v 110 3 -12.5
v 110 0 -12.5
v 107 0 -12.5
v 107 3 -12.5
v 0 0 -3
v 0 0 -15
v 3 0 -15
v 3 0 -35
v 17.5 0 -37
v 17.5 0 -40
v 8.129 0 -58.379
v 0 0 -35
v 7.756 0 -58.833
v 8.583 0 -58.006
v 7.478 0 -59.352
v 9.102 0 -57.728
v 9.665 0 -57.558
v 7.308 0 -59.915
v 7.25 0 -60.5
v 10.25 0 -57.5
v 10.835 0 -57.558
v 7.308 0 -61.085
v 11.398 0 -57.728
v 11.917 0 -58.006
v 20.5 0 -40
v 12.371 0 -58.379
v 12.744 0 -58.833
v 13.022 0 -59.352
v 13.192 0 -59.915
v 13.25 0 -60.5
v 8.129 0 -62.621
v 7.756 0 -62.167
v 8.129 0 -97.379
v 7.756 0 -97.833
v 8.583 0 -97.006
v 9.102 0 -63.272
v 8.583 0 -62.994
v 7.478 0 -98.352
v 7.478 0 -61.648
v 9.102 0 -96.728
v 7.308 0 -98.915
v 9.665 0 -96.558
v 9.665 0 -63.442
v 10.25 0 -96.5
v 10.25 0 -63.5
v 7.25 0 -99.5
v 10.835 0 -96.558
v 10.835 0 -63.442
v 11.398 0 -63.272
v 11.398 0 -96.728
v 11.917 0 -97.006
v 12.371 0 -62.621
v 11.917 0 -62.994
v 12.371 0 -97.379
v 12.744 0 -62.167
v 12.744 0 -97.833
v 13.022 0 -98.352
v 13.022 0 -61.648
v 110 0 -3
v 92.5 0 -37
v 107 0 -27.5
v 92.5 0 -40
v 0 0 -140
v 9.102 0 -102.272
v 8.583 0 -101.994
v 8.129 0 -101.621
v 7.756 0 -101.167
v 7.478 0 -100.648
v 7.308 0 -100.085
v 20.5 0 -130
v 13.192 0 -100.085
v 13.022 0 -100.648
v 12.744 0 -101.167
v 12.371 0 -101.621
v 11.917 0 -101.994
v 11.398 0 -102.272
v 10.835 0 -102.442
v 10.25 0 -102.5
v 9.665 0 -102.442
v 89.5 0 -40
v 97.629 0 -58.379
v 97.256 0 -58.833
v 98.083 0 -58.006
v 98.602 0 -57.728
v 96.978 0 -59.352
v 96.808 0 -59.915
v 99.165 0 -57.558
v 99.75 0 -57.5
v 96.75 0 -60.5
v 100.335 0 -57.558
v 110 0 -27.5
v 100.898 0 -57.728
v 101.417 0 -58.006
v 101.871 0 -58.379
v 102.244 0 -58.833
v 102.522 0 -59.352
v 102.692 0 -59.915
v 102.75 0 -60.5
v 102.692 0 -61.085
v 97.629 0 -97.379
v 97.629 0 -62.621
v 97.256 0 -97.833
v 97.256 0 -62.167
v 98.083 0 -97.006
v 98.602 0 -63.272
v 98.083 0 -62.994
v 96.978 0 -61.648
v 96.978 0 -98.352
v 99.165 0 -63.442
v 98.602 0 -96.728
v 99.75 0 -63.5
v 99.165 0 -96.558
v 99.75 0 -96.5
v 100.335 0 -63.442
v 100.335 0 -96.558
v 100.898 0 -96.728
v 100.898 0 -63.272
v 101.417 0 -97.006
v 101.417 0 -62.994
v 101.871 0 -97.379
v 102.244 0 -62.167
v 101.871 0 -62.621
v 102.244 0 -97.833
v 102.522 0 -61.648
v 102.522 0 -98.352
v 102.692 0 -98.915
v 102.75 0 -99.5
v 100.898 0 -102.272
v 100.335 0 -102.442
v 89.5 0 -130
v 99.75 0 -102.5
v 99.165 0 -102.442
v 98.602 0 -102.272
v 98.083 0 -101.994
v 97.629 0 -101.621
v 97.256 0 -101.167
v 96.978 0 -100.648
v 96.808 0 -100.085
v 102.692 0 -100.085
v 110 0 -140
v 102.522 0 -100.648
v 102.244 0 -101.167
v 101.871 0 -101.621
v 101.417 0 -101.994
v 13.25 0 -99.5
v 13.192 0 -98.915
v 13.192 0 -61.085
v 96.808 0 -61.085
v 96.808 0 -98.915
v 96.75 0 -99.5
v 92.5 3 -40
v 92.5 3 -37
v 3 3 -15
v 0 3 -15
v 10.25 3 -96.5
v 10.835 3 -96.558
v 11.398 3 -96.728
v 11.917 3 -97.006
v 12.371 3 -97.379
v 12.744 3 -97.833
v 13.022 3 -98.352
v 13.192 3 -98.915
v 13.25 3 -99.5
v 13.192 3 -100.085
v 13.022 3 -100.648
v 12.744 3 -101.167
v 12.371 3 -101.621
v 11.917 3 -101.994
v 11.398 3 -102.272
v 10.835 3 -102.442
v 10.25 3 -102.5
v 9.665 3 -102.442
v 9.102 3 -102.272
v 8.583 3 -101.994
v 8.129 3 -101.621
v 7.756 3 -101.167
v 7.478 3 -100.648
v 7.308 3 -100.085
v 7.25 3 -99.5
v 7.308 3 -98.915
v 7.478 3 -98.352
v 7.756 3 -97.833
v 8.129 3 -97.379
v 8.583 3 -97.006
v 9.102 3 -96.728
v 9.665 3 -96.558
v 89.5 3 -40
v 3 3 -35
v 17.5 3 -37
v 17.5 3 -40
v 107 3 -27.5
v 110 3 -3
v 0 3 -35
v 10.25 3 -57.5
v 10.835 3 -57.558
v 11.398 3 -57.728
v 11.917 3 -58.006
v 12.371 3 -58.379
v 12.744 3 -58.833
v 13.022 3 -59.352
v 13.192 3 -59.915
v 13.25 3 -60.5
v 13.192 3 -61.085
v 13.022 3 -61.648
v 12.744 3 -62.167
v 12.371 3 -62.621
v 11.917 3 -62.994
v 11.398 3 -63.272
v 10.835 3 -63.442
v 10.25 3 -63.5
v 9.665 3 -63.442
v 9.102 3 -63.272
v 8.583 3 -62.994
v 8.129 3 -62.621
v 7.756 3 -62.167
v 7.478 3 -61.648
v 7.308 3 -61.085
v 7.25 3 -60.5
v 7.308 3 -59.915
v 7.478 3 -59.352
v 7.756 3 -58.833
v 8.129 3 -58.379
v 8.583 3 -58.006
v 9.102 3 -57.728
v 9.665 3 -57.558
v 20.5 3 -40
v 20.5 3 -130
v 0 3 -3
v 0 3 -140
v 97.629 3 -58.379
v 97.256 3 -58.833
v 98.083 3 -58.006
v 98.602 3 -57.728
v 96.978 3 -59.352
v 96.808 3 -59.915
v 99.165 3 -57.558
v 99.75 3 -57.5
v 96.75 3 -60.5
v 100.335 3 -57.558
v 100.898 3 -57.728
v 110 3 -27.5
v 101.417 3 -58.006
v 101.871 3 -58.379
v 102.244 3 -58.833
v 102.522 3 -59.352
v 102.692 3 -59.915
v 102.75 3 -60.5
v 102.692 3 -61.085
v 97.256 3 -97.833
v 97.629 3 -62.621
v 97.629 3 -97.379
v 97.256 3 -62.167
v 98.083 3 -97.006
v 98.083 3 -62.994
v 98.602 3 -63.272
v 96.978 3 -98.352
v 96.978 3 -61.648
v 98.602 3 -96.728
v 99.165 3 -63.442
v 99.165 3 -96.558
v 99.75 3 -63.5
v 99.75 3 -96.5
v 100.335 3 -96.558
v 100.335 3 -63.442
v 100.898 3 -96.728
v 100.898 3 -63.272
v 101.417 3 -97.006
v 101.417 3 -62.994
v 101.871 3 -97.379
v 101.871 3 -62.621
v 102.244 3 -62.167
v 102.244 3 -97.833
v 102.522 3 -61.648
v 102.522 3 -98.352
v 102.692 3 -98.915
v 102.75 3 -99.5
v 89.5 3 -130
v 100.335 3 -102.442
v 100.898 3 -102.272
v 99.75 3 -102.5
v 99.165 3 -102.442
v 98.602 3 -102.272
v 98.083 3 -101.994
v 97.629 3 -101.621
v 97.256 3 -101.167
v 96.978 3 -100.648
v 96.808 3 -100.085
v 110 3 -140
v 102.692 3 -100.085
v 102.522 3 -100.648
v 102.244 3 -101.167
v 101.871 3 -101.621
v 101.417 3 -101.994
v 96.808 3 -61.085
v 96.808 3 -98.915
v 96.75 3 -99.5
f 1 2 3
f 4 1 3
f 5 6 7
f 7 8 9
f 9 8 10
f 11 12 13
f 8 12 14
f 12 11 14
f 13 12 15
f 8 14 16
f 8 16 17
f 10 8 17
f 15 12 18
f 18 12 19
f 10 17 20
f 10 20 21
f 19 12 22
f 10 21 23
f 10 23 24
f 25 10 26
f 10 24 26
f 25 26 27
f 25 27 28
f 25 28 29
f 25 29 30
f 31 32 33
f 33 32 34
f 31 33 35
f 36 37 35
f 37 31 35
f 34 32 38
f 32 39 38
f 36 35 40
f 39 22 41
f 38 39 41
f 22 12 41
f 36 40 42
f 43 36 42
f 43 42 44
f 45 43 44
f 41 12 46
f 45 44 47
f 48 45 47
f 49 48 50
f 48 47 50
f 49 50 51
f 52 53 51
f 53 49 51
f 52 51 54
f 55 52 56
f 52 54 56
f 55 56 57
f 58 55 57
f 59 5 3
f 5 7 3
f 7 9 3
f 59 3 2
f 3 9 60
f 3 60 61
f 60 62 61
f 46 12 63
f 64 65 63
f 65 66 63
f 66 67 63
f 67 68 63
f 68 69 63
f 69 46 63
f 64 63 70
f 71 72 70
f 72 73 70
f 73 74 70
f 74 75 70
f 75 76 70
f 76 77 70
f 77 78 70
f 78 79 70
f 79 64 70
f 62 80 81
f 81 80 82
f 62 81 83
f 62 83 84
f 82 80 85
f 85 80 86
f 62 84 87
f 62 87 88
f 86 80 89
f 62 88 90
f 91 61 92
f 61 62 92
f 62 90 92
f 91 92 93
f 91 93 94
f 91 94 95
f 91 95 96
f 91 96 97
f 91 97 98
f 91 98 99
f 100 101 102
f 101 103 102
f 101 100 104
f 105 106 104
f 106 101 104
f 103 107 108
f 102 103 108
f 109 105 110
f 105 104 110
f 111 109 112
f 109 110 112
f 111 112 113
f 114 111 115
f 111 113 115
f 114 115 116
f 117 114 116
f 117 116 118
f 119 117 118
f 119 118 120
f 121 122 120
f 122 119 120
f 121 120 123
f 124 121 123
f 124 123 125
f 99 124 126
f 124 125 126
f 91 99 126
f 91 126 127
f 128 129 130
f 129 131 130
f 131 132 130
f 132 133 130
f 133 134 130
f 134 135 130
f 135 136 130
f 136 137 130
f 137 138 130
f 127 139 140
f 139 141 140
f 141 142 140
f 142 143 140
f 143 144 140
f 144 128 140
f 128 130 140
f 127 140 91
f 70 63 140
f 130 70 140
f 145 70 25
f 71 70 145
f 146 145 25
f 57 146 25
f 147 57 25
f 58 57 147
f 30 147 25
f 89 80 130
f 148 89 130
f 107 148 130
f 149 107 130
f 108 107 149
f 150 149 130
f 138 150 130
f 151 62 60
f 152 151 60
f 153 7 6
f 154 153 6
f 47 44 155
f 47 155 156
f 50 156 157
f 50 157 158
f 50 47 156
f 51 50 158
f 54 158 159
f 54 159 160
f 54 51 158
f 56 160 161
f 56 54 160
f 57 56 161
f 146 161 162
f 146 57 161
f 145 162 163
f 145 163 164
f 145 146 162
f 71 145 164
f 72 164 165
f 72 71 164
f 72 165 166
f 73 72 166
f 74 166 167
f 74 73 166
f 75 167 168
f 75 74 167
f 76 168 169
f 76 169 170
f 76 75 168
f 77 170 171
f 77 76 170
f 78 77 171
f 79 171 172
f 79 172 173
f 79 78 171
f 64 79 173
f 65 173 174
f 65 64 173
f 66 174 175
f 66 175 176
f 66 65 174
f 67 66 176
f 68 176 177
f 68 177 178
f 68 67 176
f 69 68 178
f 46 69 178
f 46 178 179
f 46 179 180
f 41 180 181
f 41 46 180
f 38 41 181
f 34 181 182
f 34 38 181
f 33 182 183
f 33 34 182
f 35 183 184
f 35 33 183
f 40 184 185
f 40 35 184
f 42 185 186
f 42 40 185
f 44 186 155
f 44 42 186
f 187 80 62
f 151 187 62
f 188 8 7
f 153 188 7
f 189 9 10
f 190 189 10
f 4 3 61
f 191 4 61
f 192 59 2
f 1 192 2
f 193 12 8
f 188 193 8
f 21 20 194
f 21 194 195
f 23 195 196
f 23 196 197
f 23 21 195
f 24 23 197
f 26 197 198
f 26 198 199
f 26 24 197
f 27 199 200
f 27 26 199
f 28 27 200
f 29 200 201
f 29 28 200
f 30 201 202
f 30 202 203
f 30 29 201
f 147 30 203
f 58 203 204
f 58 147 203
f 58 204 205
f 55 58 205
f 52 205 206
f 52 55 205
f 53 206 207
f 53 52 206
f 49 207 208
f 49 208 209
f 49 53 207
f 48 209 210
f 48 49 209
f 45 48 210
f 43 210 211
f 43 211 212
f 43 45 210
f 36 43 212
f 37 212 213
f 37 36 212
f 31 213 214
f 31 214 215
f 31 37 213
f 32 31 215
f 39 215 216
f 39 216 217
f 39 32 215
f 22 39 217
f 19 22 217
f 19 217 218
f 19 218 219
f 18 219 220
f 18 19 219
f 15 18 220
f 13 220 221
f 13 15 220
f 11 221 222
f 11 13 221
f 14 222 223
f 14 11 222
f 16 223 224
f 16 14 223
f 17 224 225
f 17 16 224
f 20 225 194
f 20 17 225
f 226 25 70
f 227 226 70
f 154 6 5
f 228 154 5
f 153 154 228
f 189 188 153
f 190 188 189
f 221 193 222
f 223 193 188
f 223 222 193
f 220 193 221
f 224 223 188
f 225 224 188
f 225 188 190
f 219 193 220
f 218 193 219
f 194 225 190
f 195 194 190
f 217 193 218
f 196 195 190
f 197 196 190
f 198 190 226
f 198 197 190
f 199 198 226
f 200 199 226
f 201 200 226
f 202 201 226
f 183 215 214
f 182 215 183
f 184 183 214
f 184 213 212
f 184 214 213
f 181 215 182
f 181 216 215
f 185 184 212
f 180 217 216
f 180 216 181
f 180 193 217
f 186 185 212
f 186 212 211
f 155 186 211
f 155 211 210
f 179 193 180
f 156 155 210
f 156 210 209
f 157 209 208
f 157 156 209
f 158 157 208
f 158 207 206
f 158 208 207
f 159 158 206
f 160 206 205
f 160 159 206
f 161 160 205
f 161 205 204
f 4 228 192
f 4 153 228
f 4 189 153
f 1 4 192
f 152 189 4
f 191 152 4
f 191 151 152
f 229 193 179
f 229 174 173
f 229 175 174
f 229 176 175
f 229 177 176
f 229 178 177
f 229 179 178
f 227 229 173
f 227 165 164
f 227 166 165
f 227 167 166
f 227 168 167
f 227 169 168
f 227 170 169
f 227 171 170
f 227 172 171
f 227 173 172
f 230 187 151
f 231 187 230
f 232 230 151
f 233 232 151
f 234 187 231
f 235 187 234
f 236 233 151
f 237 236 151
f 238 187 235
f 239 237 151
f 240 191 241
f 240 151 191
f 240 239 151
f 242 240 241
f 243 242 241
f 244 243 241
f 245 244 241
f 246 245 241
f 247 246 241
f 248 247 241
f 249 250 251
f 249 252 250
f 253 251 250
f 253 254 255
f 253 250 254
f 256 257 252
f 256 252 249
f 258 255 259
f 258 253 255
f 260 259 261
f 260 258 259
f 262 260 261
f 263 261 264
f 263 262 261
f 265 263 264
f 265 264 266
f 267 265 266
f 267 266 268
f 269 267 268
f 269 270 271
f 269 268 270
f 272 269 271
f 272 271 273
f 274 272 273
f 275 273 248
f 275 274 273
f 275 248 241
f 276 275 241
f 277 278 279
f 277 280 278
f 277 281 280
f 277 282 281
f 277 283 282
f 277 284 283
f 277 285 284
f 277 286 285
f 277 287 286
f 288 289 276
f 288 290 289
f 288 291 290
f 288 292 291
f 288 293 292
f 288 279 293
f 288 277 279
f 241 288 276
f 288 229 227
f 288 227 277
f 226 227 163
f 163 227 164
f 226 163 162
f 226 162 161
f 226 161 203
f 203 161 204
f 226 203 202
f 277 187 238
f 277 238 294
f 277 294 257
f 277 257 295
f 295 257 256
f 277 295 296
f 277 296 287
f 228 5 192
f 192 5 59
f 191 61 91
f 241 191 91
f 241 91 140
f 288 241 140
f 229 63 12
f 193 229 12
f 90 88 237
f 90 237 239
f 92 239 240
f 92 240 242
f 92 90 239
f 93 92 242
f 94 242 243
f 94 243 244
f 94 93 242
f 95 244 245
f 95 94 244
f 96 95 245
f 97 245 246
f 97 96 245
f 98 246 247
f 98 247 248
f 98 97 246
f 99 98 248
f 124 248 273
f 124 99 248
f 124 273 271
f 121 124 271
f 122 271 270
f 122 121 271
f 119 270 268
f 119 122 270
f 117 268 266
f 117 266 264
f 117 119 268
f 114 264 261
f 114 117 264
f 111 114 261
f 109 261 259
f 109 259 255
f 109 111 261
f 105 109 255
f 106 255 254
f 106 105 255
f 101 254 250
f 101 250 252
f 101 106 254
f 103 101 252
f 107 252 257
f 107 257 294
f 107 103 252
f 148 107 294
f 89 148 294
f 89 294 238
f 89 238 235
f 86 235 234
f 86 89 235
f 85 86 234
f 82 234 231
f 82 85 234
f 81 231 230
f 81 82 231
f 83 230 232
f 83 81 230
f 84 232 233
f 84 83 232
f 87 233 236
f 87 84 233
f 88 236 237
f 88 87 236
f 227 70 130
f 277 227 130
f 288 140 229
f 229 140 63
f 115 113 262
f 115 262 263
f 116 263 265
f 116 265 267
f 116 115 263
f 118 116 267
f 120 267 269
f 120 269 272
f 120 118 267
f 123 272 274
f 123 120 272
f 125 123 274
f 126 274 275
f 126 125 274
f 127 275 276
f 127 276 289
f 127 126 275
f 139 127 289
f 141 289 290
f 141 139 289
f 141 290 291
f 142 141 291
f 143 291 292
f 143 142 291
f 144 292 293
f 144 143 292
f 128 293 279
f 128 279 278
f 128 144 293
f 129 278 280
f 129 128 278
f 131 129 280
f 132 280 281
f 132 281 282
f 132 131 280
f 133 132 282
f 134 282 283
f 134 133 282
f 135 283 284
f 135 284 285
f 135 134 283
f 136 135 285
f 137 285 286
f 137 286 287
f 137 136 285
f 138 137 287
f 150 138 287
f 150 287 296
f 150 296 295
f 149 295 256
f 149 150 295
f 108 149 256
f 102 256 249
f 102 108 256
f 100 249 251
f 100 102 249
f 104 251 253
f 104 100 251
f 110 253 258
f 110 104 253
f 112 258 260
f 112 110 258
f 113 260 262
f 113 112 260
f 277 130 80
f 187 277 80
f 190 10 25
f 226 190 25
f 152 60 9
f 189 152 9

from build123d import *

# Parameters (mm, degrees)
CROQUIS1_R              = 3
SALIENTE_EXTRUIR1_DEPTH = 3


with BuildPart() as part:
    # Croquis1 → Saliente-Extruir1 (new body)
    with BuildSketch(Plane(origin=(0, 0, 0), x_dir=(1, 0, 0), z_dir=(0, 1, 0))):
        Polygon((0, 3), (110, 3), (110, 12.5), (107, 12.5), (107, 20), (107, 27.5), (110, 27.5), (110, 37), (110, 140), (89.5, 140), (20.5, 140), (0, 140), (0, 50), (0, 35), (3, 35), (3, 20), (3, 15), (0, 15), align=None)
        with Locations(Location((10.25, 60.5, 0), (0, 0, 270))):
            Circle(CROQUIS1_R, mode=Mode.SUBTRACT)
        with Locations(Location((99.75, 60.5, 0), (0, 0, 270))):
            Circle(CROQUIS1_R, mode=Mode.SUBTRACT)
        with Locations(Location((10.25, 99.5, 0), (0, 0, 270))):
            Circle(CROQUIS1_R, mode=Mode.SUBTRACT)
        Polygon((92.5, 37), (89.5, 37), (20.5, 37), (17.5, 37), (17.5, 40), (20.5, 40), (20.5, 130), (89.5, 130), (89.5, 40), (92.5, 40), align=None, mode=Mode.SUBTRACT)
        with Locations(Location((99.75, 99.5, 0), (0, 0, 270))):
            Circle(CROQUIS1_R, mode=Mode.SUBTRACT)
    extrude(amount=SALIENTE_EXTRUIR1_DEPTH)


solid = part.part
